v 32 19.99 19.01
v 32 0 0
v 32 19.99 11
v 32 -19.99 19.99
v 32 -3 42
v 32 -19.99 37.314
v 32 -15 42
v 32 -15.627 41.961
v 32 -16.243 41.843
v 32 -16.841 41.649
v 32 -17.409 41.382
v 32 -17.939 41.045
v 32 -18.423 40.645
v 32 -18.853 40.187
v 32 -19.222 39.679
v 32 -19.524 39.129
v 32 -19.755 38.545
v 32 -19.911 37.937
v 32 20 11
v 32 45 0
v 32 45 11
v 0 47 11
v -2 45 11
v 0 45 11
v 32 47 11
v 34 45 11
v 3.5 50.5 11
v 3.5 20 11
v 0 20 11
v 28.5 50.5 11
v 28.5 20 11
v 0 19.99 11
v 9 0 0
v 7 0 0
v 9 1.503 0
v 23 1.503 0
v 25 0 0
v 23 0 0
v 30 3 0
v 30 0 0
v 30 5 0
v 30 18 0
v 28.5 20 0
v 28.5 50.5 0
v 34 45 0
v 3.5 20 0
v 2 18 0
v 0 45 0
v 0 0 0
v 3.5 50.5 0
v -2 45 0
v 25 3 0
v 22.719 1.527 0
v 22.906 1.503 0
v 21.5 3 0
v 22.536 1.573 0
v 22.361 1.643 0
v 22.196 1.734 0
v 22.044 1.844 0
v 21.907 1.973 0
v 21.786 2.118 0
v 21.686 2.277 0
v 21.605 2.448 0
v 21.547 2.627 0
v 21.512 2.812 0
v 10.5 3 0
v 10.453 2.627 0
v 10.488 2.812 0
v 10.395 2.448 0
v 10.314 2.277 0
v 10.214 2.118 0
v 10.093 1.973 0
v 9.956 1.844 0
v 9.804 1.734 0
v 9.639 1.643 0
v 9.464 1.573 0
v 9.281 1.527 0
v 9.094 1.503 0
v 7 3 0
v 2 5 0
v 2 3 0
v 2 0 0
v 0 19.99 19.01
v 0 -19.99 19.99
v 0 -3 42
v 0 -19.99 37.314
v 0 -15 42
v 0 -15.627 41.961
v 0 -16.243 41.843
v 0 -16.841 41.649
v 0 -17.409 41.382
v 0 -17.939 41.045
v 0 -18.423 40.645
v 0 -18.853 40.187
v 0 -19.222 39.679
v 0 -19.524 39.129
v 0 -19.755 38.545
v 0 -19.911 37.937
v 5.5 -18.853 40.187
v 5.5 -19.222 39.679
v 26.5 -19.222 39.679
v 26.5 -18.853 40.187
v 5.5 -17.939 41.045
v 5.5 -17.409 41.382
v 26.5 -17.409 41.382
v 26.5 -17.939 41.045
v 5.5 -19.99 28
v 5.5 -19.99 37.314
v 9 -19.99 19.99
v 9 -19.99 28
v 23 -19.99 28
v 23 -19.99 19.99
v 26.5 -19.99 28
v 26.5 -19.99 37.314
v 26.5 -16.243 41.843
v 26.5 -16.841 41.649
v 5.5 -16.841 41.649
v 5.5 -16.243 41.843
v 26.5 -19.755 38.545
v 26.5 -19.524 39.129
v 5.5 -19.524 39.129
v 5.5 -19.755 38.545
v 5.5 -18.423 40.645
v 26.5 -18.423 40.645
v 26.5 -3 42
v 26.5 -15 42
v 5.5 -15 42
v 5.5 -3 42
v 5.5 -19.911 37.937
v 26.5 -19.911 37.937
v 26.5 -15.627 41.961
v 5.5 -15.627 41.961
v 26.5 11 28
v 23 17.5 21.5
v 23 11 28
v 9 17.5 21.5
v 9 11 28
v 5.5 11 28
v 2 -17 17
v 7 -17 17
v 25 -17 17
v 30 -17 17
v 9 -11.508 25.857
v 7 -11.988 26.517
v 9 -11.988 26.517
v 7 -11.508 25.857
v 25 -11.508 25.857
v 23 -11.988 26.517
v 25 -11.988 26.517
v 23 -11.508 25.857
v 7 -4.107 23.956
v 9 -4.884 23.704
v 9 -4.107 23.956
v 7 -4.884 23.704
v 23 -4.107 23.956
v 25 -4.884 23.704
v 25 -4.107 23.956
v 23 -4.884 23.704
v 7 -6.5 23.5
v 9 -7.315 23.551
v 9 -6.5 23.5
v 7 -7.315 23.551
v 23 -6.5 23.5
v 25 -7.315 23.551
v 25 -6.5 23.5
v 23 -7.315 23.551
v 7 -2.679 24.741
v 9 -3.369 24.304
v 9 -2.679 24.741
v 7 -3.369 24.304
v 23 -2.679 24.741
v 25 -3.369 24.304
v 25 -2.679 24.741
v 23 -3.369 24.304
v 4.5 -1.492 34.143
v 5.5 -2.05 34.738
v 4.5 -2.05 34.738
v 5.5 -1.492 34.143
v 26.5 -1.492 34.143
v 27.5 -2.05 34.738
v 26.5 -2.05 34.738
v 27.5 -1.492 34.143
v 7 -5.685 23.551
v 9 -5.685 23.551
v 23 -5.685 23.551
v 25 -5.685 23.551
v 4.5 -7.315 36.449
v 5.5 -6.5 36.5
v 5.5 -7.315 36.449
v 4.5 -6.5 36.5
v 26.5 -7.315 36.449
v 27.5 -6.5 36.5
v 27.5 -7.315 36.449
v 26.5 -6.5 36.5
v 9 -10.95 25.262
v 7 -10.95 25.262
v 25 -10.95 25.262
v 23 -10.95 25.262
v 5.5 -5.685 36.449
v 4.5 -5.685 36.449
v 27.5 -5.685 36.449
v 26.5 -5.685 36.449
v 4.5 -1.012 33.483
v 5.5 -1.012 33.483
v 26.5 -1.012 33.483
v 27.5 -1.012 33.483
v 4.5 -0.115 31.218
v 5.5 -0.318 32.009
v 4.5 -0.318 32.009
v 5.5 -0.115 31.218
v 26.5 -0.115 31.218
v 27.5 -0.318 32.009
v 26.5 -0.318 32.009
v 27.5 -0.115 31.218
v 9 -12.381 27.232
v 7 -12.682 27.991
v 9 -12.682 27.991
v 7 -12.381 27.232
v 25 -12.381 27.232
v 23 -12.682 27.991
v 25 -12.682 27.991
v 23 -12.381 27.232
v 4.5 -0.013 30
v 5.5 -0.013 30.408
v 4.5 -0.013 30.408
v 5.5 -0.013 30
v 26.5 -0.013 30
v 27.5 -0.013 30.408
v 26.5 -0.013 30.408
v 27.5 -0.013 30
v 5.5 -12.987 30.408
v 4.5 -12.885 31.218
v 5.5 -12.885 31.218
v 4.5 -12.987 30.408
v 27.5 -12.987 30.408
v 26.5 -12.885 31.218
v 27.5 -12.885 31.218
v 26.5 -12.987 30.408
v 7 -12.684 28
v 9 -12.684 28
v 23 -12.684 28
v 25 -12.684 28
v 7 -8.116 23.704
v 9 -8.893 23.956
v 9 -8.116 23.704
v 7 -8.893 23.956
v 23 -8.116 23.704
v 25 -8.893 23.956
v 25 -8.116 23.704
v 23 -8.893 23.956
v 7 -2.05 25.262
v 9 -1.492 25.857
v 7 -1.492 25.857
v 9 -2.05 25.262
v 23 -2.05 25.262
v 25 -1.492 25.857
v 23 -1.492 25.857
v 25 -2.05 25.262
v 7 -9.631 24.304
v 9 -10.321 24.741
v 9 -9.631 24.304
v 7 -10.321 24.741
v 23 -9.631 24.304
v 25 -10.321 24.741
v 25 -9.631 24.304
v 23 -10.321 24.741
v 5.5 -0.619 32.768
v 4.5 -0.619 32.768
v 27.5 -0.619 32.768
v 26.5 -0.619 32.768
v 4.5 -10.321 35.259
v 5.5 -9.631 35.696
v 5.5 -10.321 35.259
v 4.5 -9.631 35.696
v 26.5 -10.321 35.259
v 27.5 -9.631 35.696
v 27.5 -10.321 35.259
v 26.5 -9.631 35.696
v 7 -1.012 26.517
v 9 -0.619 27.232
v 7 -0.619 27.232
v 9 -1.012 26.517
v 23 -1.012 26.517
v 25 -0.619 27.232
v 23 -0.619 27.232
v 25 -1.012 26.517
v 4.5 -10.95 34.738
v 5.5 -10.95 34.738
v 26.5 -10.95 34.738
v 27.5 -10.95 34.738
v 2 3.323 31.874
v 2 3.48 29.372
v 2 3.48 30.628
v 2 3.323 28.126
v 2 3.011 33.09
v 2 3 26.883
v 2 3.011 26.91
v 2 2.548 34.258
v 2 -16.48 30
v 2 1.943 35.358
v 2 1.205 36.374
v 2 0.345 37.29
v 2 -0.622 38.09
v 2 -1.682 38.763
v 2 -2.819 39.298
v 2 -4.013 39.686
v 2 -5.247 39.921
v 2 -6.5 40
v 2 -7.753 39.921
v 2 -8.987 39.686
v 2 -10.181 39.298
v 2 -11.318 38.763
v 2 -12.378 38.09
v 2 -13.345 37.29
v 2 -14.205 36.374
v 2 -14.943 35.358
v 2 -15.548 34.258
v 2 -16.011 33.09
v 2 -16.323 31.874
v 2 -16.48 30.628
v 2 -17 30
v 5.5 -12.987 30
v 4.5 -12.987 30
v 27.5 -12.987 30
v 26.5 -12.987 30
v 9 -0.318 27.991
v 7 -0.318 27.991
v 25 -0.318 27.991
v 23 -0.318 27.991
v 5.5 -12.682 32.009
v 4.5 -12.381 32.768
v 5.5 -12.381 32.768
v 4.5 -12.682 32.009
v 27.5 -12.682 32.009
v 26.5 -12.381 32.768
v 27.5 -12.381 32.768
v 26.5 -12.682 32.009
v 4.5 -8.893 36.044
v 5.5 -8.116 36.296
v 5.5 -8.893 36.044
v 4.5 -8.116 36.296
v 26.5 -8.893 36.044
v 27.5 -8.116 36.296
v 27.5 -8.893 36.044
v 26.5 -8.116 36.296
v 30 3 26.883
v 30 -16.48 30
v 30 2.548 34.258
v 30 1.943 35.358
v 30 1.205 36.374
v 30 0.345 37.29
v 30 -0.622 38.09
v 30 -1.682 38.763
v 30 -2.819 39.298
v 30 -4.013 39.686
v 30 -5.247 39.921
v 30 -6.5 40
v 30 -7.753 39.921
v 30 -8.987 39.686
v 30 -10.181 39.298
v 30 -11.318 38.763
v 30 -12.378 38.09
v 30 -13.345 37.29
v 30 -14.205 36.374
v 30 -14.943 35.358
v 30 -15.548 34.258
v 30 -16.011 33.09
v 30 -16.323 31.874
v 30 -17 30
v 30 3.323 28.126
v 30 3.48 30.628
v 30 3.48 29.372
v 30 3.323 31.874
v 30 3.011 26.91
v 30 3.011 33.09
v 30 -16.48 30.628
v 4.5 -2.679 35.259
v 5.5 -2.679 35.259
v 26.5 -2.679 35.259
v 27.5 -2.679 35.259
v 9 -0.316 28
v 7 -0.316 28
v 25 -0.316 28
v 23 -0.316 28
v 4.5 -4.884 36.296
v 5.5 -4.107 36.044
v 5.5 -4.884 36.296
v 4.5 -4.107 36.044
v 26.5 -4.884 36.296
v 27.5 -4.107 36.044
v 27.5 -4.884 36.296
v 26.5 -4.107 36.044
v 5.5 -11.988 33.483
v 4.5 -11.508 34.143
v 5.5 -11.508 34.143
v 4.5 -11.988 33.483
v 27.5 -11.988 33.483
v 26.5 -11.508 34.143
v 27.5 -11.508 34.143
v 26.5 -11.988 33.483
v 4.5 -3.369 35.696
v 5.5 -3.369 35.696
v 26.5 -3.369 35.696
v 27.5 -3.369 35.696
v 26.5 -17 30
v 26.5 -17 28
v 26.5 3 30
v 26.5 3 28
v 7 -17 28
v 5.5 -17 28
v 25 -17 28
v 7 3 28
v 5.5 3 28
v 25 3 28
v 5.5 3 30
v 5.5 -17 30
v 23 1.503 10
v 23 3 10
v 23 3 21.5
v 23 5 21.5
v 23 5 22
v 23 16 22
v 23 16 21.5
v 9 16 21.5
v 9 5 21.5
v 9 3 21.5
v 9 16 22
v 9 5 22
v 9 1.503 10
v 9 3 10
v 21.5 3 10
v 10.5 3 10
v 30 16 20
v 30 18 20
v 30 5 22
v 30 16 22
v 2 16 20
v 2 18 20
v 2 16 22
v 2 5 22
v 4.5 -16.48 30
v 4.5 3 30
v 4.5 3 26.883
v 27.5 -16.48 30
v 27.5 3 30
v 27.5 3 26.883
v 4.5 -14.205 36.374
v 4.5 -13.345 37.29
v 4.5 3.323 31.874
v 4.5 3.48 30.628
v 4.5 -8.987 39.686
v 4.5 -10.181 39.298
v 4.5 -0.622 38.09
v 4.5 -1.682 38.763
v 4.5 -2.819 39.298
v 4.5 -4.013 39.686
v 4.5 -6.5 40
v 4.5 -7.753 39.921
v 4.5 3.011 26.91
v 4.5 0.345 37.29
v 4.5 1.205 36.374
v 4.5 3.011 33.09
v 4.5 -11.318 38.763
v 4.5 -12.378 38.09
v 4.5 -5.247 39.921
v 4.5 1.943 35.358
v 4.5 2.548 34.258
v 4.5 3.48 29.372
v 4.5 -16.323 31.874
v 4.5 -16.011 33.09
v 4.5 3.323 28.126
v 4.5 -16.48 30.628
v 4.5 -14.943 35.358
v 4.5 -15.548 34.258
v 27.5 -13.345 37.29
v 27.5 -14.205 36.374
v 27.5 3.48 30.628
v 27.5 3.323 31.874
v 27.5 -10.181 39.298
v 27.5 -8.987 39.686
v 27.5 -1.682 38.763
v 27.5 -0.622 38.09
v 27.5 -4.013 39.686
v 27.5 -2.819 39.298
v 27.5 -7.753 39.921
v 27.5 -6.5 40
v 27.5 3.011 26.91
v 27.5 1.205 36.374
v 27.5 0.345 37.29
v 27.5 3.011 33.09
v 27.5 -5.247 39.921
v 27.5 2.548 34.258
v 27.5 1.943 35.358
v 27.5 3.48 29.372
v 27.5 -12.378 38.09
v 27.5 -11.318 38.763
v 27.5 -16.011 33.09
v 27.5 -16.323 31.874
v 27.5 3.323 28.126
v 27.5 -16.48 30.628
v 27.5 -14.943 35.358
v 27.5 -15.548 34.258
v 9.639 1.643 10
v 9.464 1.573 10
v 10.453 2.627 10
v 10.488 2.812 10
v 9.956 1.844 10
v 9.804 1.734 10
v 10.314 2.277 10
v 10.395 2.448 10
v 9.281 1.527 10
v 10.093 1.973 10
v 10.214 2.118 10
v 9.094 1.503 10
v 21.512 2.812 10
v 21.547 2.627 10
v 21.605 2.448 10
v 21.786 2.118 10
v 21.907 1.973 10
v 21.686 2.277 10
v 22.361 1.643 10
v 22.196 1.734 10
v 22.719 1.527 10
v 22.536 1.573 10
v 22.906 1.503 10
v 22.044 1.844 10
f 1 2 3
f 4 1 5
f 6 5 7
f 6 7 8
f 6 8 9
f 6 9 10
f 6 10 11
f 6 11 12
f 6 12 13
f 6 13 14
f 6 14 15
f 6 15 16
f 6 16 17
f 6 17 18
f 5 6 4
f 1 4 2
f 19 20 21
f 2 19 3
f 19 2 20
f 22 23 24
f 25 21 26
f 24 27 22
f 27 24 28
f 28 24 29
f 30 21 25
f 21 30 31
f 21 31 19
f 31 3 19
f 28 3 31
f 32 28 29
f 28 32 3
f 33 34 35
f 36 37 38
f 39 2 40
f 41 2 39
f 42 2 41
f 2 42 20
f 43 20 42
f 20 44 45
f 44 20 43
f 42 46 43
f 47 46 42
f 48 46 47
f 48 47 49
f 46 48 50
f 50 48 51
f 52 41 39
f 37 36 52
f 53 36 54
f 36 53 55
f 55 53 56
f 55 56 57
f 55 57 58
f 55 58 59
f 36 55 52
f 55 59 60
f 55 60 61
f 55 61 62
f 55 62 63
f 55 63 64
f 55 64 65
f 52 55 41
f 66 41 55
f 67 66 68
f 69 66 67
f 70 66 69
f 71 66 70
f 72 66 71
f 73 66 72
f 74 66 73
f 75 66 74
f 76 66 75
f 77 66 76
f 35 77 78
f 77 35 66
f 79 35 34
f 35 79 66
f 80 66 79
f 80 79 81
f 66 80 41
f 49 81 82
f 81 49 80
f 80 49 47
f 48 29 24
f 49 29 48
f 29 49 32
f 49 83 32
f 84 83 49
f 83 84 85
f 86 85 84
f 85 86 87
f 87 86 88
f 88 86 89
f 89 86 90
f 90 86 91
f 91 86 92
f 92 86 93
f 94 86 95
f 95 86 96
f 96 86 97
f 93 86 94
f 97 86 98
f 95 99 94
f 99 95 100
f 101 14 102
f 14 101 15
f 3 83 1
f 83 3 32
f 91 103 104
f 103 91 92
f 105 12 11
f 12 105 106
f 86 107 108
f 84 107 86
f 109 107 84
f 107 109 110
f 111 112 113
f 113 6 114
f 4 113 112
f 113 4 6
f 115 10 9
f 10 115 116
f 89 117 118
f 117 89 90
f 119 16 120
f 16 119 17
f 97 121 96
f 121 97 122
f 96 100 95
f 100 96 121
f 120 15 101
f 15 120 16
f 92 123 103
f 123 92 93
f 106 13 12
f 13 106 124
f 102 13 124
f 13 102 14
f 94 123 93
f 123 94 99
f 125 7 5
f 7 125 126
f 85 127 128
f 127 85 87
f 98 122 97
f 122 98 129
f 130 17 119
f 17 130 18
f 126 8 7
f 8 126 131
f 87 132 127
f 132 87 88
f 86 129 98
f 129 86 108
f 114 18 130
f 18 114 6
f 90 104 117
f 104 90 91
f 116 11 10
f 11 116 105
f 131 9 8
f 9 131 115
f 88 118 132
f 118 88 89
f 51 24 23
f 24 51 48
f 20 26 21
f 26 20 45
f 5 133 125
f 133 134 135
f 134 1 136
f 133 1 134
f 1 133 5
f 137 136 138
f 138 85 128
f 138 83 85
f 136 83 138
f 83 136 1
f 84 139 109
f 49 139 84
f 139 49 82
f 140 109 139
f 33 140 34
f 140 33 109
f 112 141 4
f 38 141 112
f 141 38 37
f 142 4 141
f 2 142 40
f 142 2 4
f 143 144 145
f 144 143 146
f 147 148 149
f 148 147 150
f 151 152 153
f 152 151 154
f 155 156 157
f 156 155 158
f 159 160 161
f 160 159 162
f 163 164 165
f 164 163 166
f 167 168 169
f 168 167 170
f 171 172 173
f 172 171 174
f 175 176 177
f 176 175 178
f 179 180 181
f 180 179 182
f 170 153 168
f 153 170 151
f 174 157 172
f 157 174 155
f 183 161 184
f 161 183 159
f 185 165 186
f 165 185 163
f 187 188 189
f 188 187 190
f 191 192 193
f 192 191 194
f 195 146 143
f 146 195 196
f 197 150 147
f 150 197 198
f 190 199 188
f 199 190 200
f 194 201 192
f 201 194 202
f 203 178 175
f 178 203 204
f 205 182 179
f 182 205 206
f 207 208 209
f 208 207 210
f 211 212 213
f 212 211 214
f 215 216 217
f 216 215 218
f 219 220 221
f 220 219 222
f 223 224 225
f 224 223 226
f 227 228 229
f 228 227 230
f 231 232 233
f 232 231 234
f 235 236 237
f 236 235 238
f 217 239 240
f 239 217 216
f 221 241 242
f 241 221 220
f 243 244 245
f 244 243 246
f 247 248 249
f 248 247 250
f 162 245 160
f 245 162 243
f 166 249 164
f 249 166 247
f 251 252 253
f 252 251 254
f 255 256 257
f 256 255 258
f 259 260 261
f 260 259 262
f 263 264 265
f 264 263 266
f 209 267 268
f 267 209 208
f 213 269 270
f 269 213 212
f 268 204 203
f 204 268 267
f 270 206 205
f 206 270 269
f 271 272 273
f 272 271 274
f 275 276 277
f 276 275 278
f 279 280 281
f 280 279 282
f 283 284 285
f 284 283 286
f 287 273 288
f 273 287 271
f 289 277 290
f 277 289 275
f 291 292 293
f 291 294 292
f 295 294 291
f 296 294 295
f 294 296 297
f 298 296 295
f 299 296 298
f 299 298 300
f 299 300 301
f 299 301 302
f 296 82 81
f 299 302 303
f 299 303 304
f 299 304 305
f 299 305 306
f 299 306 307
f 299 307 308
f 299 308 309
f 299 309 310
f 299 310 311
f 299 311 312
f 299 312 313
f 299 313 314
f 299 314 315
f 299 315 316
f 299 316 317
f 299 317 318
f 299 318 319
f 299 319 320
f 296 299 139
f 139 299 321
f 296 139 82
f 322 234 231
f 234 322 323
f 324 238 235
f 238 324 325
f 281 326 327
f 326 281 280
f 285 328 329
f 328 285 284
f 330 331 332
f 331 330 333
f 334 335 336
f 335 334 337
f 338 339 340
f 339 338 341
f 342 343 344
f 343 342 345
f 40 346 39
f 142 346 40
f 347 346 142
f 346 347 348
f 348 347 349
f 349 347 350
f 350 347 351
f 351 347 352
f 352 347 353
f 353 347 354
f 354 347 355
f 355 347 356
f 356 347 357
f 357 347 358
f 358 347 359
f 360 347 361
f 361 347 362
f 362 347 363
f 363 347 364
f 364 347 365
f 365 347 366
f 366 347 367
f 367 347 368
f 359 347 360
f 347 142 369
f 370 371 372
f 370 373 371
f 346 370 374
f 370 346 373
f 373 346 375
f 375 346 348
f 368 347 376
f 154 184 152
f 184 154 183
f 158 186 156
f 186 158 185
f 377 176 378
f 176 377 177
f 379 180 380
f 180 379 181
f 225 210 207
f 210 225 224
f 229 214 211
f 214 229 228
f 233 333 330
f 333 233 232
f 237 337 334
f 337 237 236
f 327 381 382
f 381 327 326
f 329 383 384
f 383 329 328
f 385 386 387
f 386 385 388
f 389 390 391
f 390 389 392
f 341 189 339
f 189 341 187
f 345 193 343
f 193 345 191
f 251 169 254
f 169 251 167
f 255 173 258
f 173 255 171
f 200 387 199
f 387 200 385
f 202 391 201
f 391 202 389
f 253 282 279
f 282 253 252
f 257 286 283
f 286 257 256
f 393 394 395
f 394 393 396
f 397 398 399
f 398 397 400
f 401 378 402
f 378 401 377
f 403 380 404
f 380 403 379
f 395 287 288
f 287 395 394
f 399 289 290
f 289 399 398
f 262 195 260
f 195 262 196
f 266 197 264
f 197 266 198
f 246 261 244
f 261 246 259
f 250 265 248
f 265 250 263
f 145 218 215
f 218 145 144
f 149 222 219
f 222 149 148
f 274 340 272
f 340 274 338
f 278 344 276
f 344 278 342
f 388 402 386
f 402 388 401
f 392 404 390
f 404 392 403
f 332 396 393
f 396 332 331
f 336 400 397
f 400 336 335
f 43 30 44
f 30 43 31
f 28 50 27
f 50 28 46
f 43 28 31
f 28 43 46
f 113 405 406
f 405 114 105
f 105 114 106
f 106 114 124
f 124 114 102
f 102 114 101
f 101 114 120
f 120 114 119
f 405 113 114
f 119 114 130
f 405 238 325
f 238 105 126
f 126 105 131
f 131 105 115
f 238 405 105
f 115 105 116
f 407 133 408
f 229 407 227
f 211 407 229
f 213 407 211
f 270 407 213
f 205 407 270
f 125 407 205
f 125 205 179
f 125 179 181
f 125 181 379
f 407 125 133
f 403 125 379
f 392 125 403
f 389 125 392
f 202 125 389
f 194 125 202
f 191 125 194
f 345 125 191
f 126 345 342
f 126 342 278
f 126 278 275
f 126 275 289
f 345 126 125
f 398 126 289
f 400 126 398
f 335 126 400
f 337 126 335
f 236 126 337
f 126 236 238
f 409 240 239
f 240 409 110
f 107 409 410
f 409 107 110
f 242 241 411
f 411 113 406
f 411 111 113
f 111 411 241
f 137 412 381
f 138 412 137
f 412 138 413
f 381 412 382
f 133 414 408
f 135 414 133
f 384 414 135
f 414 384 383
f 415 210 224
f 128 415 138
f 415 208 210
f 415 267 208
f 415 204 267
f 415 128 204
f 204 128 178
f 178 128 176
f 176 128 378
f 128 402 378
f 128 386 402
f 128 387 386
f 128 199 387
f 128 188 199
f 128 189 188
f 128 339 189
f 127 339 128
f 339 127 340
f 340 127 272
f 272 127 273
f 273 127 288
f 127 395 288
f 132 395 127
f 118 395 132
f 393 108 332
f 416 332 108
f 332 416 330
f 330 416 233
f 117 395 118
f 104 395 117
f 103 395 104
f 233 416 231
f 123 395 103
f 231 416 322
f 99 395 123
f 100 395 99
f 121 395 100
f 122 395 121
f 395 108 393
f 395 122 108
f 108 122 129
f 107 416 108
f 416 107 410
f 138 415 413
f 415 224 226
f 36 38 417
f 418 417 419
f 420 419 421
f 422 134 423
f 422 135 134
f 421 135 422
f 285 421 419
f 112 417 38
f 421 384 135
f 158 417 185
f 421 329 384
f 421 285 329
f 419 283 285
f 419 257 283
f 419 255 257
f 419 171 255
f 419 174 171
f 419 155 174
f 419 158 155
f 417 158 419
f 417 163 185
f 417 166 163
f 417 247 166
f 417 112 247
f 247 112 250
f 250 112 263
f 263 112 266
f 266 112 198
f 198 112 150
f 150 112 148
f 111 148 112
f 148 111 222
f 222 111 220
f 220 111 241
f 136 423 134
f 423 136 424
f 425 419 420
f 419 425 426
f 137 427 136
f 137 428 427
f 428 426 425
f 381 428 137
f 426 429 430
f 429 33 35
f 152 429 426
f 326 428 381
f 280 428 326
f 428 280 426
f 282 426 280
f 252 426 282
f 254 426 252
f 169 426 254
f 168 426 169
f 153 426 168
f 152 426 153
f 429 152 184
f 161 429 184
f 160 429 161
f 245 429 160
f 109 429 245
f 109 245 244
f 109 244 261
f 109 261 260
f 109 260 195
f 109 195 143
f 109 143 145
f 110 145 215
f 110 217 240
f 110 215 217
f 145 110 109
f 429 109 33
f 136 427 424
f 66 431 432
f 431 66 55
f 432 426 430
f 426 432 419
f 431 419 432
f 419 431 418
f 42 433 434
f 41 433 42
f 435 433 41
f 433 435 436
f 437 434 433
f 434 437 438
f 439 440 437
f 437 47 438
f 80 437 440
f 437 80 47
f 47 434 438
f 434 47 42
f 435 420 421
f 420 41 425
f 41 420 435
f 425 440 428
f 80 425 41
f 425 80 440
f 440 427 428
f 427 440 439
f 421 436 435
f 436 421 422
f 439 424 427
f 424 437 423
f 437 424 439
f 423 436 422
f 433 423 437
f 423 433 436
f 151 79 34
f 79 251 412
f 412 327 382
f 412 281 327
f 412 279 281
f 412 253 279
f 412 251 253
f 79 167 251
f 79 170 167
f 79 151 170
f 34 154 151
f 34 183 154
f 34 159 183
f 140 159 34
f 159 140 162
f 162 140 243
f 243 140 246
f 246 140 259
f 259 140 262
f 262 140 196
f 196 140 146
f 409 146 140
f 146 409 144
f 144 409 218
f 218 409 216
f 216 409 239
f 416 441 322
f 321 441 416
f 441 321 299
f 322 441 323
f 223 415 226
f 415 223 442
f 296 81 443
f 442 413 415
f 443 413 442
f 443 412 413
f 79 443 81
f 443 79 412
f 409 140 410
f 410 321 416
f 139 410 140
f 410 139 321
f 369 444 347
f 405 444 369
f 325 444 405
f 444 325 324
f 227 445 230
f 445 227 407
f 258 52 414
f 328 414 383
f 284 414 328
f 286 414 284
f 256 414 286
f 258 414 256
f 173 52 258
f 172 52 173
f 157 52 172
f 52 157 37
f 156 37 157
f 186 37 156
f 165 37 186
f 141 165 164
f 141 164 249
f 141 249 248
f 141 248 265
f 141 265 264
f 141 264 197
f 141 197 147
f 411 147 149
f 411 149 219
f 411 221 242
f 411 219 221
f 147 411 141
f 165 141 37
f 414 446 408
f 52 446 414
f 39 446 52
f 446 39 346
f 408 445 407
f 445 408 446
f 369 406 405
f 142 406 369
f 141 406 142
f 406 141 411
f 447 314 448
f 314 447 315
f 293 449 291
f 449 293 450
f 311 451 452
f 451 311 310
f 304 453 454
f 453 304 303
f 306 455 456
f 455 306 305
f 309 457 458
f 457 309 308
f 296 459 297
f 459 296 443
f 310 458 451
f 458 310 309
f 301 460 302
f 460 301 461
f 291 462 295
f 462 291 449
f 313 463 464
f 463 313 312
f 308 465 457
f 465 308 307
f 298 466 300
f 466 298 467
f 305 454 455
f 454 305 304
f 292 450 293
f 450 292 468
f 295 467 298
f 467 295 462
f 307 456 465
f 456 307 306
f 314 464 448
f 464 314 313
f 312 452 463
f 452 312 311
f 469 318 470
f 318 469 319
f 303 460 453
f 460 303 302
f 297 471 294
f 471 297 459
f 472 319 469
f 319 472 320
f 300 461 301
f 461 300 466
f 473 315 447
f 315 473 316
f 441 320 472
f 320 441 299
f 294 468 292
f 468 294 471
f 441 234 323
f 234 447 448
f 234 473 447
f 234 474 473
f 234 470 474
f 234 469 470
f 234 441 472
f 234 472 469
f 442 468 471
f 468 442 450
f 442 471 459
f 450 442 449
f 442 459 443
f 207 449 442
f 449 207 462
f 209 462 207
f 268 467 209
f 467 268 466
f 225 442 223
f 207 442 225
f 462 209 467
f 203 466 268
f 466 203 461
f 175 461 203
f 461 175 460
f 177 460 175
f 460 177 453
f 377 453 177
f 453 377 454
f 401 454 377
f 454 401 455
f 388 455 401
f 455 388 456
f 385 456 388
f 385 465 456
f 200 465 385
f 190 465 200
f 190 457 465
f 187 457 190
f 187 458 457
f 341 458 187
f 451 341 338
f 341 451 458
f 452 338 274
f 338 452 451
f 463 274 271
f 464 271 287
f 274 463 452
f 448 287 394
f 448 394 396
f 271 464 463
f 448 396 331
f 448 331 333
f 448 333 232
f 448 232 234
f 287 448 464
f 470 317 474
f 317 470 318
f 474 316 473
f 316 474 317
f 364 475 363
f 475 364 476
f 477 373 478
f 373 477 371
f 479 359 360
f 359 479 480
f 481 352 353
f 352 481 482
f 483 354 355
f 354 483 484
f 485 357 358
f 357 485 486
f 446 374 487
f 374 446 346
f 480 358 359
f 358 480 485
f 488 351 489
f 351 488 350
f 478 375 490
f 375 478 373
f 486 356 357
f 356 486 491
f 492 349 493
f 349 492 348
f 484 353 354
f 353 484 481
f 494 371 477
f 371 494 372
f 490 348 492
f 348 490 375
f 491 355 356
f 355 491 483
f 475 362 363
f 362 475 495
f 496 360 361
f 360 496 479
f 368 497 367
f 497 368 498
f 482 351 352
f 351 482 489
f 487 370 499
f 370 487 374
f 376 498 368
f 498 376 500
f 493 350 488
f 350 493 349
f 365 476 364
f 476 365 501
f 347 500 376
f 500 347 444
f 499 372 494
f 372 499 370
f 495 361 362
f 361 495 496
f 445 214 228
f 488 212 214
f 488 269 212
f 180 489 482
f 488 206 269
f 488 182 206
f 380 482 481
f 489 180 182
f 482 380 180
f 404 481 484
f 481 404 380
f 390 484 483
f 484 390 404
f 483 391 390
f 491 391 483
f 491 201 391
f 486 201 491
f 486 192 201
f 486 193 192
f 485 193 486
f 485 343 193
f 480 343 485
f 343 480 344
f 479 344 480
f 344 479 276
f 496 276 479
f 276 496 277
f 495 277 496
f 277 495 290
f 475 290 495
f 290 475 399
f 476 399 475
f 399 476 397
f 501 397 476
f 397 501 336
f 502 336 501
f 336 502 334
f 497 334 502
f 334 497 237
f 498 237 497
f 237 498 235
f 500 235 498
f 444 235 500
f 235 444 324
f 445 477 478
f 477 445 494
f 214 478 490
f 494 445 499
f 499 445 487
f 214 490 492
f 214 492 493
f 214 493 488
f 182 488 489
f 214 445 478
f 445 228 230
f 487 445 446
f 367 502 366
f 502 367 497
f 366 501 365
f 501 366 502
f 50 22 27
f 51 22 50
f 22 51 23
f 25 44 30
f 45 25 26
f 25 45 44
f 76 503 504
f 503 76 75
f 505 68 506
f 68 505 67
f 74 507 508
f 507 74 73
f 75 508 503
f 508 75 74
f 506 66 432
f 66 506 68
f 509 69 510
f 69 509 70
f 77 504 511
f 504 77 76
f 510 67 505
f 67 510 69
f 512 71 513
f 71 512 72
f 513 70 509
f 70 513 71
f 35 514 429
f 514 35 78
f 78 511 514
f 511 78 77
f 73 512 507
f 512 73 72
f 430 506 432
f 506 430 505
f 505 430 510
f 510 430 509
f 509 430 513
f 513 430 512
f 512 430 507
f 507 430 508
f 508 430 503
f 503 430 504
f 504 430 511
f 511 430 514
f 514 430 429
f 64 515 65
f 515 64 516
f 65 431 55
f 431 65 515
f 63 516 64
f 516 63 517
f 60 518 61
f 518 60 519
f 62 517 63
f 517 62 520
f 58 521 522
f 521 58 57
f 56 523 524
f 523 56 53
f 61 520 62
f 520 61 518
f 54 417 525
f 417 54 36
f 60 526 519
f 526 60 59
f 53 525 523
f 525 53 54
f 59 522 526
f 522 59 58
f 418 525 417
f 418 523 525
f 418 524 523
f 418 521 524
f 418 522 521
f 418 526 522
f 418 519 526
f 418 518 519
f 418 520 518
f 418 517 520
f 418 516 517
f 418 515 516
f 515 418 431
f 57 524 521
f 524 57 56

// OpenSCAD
// Kompost gångjärn

bas_x = 32;
bas_y = 55;
bas_z = 11;
rod_h = 30;

rod_hole = 13;
rod_d = 28;
rod_hole_x = 21;
rod_hole_x2 = 14;
clips = 3.5;
wall = 2;
y_clip = 20;
rygg = 3;

avrund = 5;
uthang = 20;
framhang = 20;
hanghojd = 42; // totala höjden på objektet

f_clip = 25; // avstånd från framhang till fästklipps
f_clip_x = 2; // hur stor ihakningen är i klippet

fn = 50; // upplösning på hål

union() {
    difference() {
        union() {
            cube([bas_x,bas_y,bas_z]);
            hull() {
                translate([0,framhang-avrund,hanghojd-avrund]) rotate([0,90,0]) cylinder(r=avrund,h=bas_x, $fn=fn);
                translate([0,-uthang+avrund,hanghojd-avrund]) rotate([0,90,0]) cylinder(r=avrund,h=bas_x, $fn=fn);
                translate([0,-uthang+avrund,avrund]) rotate([0,90,0]) cylinder(r=avrund,h=bas_x, $fn=fn);
                translate([0,framhang-avrund,avrund]) rotate([0,90,0]) cylinder(r=avrund,h=bas_x, $fn=fn);
            }
            //framklippsen
            translate([-f_clip_x,bas_y-(bas_y-framhang-f_clip),0]) cube([bas_x+f_clip_x*2,bas_y-framhang-f_clip,bas_z]);
        }
        
        //övre skär på framklips
        translate([0,framhang,bas_z]) cube([bas_x,bas_y,bas_z*3]);
        
        //vinklade skär
        translate([0,y_clip,bas_z+8]) rotate([45,0,0])cube([bas_x,bas_y,bas_z*4]);
        translate([0,0,0]) rotate([45+180,0,0]) translate([0,0,-bas_z*4]) cube([bas_x,bas_y,bas_z*4]);
        
        //hålet för locket
        translate([wall,-rod_hole/2,rod_h]) rotate([0,90,0]) cylinder(d=rod_hole,h=bas_x-wall*2, $fn=fn);
        
        //clips
        translate([clips,y_clip,-1]) cube([bas_x-clips*2,bas_y,bas_z*2]);
        
        //hålets bredskärning
        translate([(bas_x-rod_hole_x)/2,-30,rod_h-wall]) cube([rod_hole_x,bas_y,100]);
        translate([(bas_x-rod_hole_x2)/2,-30,rod_h-rod_hole/2-2]) cube([rod_hole_x2,bas_y,100]);
        
        //luftning
        translate([(bas_x-rod_hole_x2)/2,-bas_y+rygg,-1]) cube([rod_hole_x2,bas_y,100]);
        translate([wall,rygg+wall,-2]) cube([bas_x-wall*2,y_clip-wall*2-rygg,bas_z*2]);
        translate([wall,rygg+wall,-1]) cube([bas_x-wall*2,y_clip-wall*2-rygg-wall,bas_z*2+wall/2]);
        
        //luftning vid hålet
        translate([wall,rygg-uthang,0]) cube([(bas_x-rod_hole_x2-wall*4)/2,uthang,rod_h]);
        translate([bas_x/2+rod_hole_x2/2+wall,rygg-uthang,0]) cube([(bas_x-rod_hole_x2-wall*4)/2,uthang,rod_h]);
        //luftning i hålet
        temp1 = (bas_x-rod_hole_x)/2 -wall/2 -wall;//höjden på cylindern i luftningen
        translate([wall,-rod_hole/2,rod_h]) rotate([0,90,0]) cylinder(d=20,h=temp1, $fn=fn);
        translate([bas_x-wall-temp1,-rod_hole/2,rod_h]) rotate([0,90,0]) cylinder(d=20,h=temp1, $fn=fn);
        
        // sågning framklips
        translate([-f_clip_x,framhang+f_clip,0]) rotate([0,0,45]) cube([20,20,bas_z]);
        translate([f_clip_x+bas_x,framhang+f_clip,0]) rotate([0,0,45]) cube([20,20,bas_z]);
        
    }
    //påfyllnad efter skärningar
    translate([ (bas_x-rod_hole_x2)/2, rygg, 0]) cylinder(d=3,h=10, $fn=fn);
    translate([ (bas_x-rod_hole_x2)/2+rod_hole_x2, rygg, 0]) cylinder(d=3,h=10, $fn=fn);
}
